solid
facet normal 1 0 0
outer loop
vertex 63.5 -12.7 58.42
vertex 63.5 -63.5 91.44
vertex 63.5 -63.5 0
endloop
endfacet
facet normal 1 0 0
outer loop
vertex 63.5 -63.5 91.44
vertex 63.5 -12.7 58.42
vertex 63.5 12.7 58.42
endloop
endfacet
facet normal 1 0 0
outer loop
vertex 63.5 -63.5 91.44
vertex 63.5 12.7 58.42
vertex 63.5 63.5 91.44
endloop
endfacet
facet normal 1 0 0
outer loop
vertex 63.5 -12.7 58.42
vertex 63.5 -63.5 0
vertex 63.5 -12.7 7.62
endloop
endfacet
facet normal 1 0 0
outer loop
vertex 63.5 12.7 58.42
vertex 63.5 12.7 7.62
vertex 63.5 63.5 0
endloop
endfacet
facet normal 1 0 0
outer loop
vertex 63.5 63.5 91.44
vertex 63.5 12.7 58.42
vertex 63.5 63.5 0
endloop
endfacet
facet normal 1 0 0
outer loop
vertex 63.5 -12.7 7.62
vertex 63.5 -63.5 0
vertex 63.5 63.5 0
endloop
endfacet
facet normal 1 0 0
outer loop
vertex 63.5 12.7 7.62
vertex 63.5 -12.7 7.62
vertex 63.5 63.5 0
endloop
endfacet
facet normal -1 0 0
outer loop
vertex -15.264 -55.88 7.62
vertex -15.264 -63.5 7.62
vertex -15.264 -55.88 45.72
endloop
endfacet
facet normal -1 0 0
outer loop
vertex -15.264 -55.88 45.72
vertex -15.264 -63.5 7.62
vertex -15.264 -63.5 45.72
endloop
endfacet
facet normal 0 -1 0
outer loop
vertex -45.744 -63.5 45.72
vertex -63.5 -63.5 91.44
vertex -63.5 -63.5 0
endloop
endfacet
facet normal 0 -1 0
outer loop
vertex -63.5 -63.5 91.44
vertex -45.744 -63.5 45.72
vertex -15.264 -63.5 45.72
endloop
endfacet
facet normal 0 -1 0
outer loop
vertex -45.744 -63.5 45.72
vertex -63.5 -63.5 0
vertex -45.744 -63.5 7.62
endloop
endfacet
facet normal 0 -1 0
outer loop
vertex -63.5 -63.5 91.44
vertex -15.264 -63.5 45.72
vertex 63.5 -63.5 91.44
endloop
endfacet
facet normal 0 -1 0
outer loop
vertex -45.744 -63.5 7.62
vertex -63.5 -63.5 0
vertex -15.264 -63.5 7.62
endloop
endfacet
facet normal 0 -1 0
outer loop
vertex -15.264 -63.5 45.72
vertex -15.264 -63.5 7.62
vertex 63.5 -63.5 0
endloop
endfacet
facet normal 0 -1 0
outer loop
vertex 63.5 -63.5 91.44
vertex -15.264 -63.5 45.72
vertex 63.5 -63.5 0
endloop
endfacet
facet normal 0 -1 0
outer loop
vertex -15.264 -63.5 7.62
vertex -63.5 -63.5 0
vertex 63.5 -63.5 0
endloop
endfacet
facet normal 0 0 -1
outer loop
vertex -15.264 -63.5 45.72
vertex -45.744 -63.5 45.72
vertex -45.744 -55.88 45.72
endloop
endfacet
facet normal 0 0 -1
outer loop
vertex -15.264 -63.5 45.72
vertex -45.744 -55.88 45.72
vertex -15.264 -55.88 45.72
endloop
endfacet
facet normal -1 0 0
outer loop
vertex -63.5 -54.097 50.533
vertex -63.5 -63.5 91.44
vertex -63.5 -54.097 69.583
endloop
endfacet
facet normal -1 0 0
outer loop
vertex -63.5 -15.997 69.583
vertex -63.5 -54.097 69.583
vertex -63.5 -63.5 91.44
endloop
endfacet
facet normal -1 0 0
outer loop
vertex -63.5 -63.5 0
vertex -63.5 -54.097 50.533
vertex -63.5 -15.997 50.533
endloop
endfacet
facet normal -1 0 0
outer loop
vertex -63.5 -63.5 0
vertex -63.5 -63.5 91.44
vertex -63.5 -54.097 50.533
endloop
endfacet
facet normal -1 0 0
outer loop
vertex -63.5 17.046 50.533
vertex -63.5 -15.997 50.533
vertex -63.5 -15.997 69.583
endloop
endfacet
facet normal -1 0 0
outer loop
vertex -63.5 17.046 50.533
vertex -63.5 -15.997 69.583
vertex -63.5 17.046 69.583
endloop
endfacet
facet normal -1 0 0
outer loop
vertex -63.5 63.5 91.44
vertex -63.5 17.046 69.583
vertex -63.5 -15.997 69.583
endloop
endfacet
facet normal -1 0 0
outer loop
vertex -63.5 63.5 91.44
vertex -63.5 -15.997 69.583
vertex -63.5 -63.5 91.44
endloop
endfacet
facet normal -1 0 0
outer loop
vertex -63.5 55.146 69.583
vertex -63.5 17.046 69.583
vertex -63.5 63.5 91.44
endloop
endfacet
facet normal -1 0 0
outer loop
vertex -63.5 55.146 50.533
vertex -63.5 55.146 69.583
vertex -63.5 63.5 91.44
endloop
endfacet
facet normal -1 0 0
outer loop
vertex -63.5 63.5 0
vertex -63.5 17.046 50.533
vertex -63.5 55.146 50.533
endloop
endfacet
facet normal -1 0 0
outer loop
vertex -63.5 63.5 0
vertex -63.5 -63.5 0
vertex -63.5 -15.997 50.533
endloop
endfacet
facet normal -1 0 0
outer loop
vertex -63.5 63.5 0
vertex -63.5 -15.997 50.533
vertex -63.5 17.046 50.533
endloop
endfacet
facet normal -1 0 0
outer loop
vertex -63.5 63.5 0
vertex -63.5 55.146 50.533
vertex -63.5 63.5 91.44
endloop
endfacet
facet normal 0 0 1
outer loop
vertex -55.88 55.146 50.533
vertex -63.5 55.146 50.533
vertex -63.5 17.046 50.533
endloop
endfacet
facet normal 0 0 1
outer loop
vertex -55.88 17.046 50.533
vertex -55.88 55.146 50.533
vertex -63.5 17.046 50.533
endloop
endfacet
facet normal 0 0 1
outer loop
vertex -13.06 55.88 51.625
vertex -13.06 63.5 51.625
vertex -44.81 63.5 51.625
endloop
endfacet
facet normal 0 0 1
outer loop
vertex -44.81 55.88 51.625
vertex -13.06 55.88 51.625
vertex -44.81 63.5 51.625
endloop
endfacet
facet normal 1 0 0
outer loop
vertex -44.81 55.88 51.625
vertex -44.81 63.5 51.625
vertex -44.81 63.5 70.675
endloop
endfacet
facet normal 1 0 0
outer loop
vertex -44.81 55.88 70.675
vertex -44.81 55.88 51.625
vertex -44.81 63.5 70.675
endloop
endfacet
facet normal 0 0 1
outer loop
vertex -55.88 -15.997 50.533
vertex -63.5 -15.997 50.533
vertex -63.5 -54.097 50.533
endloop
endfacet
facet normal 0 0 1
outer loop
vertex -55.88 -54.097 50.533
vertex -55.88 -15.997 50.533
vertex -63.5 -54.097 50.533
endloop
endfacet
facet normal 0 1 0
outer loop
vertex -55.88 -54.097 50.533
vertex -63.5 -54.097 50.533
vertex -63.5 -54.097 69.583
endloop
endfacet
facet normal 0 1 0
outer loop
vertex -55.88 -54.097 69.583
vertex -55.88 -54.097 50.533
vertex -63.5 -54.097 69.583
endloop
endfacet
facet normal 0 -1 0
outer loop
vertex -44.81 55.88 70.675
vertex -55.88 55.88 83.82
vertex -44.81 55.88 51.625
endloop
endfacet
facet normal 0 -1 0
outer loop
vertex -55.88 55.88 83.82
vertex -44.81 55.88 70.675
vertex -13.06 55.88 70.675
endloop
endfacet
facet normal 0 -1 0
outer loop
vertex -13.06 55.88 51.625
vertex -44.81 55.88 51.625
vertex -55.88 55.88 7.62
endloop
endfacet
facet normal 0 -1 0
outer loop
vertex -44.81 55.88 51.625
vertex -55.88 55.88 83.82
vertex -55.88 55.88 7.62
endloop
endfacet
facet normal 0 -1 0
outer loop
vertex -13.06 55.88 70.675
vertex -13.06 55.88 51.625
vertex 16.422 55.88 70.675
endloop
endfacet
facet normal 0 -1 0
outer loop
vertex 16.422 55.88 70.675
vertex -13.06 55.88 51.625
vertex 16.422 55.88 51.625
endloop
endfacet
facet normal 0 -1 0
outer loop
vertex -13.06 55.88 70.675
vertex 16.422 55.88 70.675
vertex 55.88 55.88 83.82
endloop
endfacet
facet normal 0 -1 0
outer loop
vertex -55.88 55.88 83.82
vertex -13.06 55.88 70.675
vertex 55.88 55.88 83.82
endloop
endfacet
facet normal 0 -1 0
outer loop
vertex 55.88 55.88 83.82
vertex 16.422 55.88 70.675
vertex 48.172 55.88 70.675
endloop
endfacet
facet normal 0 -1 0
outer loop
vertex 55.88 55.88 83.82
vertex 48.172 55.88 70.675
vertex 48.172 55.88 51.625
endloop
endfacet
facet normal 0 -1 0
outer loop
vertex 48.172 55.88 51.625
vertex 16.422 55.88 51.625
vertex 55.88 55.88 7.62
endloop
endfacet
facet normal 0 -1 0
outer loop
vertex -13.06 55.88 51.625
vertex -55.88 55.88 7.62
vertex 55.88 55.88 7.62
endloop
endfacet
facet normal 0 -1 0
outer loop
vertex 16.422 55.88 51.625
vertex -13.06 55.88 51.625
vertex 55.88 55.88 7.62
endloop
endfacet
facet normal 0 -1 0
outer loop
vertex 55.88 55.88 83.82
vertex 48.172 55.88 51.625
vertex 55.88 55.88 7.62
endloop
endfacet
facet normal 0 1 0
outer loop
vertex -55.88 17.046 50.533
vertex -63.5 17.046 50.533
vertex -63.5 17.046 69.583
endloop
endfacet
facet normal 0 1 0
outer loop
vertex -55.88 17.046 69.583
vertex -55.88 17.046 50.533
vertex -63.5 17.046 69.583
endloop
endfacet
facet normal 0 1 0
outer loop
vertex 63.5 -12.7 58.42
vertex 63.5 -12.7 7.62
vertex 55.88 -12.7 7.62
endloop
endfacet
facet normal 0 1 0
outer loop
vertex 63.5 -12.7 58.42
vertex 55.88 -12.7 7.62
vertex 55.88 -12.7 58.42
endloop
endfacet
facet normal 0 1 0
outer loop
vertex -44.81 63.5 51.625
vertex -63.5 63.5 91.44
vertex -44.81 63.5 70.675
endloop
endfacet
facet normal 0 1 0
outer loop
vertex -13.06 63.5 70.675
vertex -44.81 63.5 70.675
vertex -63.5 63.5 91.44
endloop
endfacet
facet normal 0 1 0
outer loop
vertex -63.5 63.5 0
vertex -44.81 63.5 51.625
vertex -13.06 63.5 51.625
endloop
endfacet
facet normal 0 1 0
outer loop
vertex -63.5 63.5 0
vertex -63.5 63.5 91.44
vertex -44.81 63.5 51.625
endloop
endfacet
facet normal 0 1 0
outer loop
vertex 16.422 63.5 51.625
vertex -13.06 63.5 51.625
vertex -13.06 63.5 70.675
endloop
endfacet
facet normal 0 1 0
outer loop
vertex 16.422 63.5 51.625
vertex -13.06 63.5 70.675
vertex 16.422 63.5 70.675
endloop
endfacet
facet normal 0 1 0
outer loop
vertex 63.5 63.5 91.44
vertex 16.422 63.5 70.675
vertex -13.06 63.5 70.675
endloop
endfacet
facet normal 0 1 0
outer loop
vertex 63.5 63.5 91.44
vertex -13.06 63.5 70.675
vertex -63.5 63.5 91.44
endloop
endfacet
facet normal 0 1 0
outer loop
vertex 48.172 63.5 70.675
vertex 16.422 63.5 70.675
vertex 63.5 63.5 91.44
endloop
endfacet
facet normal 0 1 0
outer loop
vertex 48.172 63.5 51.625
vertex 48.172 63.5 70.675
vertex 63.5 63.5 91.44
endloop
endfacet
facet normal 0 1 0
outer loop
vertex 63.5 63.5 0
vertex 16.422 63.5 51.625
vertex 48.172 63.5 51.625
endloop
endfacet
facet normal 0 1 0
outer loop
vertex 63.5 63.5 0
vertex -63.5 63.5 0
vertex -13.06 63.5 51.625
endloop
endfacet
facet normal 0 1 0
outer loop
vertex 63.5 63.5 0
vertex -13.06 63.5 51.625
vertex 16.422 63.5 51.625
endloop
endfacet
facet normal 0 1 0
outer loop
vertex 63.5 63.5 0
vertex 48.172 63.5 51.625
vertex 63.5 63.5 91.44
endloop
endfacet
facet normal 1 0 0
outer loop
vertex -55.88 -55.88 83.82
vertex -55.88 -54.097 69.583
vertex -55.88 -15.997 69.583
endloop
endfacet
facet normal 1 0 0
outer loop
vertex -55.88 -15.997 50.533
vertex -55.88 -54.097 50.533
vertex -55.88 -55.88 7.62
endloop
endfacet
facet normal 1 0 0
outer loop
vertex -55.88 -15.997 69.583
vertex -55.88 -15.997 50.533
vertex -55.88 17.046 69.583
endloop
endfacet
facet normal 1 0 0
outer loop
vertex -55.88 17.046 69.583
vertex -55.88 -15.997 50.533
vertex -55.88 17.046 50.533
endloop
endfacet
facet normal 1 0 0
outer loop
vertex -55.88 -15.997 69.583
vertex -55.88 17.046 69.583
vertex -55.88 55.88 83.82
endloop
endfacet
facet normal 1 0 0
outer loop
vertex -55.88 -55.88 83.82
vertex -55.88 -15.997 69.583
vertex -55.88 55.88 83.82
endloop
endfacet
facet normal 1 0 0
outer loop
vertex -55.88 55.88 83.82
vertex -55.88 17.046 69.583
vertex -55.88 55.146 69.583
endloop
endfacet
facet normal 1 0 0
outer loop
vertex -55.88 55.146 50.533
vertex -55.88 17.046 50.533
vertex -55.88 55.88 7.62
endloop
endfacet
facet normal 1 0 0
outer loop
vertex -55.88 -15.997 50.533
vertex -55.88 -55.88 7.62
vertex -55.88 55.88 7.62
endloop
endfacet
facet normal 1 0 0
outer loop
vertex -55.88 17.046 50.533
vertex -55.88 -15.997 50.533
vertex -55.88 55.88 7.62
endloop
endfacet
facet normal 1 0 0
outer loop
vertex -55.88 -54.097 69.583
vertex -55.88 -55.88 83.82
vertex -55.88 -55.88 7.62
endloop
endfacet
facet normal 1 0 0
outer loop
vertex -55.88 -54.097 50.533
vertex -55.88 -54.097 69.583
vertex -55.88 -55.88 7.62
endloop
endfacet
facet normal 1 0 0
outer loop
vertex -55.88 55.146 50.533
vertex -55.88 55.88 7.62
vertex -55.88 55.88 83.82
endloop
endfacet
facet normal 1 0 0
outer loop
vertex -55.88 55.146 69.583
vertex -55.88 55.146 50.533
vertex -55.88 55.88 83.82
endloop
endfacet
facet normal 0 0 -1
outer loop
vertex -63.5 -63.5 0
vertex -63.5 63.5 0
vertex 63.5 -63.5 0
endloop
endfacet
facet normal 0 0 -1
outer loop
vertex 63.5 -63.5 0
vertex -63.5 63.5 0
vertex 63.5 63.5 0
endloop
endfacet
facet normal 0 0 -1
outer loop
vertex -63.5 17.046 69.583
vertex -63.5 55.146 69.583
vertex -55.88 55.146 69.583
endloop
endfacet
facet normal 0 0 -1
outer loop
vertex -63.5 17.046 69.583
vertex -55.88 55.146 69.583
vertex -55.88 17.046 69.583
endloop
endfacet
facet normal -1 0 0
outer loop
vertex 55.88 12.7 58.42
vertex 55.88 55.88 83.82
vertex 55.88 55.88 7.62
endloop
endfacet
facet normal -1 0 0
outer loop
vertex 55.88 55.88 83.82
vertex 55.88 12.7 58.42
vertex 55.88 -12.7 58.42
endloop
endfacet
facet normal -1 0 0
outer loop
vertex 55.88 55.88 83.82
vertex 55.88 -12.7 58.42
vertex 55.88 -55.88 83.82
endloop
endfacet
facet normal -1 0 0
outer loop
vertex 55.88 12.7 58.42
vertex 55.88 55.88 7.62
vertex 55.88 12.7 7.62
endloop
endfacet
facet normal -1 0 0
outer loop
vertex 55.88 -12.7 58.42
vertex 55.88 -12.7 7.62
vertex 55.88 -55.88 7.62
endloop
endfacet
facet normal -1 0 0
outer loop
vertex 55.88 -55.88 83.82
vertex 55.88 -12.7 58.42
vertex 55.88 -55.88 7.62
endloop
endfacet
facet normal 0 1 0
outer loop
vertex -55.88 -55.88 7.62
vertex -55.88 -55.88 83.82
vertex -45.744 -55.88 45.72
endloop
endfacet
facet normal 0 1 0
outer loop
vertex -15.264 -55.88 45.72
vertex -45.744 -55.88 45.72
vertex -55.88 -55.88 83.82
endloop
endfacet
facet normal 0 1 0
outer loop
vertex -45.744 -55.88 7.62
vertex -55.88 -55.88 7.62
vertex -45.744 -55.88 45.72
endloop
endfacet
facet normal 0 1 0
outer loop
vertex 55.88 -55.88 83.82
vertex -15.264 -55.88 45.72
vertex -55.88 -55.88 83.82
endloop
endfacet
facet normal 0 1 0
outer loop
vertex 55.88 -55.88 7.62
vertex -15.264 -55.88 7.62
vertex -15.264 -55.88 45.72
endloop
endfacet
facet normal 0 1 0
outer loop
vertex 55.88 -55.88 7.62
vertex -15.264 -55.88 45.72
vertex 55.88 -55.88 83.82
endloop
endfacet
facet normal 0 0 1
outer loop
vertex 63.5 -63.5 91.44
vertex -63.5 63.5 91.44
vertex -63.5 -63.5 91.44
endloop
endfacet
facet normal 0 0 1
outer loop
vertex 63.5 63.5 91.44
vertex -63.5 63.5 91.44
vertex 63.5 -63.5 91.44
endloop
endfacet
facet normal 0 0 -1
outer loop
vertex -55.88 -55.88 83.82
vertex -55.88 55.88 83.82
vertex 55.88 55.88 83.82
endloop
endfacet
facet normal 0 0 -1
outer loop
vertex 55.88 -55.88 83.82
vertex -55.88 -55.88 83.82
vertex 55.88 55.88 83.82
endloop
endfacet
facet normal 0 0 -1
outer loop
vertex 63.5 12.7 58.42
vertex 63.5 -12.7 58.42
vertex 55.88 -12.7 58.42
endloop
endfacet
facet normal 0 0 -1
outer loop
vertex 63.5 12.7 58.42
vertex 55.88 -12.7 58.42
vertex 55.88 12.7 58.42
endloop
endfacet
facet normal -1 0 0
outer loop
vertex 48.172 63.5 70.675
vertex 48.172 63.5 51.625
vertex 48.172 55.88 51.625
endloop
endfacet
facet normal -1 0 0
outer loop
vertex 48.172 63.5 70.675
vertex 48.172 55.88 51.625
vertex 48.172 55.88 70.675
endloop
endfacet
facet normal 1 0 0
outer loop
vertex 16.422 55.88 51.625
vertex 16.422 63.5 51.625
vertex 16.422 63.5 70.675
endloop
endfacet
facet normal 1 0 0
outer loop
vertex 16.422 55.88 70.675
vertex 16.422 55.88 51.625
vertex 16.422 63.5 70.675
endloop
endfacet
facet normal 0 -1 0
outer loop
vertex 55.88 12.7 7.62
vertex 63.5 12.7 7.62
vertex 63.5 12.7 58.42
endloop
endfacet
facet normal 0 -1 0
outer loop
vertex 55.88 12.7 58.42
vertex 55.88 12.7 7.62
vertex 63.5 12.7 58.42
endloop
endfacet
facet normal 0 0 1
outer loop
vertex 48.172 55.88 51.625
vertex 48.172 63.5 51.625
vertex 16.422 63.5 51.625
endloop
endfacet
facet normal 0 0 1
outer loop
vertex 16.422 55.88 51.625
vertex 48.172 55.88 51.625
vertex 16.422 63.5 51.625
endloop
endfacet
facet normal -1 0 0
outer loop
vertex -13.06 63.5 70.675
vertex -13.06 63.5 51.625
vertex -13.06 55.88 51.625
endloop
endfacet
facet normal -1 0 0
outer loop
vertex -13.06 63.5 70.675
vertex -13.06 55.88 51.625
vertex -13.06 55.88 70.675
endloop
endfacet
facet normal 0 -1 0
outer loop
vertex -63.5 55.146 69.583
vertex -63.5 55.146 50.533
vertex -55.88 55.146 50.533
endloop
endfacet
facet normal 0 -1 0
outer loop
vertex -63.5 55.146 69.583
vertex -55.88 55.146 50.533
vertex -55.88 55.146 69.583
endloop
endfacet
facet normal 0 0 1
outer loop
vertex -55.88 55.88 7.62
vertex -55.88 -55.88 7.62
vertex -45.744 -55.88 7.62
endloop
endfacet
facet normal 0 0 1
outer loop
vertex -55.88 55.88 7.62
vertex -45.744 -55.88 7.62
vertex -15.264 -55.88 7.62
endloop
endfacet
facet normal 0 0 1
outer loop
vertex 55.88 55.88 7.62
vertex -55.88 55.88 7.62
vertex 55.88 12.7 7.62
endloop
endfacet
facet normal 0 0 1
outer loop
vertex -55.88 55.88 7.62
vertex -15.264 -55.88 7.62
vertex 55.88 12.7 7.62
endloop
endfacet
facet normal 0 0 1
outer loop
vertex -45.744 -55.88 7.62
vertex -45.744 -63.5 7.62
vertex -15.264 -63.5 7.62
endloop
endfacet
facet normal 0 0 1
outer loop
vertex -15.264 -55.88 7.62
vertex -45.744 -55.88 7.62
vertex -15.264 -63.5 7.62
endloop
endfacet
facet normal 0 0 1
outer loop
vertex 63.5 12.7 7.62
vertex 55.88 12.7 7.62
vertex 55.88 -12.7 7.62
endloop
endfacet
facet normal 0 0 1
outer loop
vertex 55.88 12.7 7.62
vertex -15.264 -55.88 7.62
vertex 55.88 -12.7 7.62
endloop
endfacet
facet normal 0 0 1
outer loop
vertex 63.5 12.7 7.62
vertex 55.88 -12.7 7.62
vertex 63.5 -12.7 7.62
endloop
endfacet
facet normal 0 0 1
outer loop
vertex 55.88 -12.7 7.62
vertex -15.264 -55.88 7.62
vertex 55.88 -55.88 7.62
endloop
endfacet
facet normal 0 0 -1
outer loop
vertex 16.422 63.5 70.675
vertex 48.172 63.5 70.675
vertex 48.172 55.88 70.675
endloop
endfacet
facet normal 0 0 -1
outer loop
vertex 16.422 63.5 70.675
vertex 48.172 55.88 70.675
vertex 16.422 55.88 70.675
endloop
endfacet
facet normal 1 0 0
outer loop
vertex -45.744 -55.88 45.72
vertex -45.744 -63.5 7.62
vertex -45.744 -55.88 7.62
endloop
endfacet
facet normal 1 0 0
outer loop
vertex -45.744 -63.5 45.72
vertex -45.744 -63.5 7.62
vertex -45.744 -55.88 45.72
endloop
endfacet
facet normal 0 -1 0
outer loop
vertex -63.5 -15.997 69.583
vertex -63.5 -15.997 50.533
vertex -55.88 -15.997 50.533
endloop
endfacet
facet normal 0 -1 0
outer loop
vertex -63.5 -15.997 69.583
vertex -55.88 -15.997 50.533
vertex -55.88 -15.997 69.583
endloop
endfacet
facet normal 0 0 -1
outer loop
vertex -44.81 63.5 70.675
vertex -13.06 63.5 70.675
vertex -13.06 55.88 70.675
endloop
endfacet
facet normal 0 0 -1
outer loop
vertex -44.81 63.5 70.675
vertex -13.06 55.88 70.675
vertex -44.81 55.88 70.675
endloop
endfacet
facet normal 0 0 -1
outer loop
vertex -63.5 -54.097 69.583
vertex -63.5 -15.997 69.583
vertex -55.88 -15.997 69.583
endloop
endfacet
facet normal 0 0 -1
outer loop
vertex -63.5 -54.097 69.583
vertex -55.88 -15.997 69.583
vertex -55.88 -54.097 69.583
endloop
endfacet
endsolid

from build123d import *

# Parameters (mm, degrees)
F0_W      = 127
F0_H      = 127
F1_DEPTH  = 7.62
F2_W      = 111.76
F2_H      = 7.62
F3_DEPTH  = 76.2
F4_W      = 25.4
F4_H      = 50.8
F5_DEPTH  = 7.62
F6_W      = 31.75
F6_H      = 19.05
F7_DEPTH  = 7.62
F8_W      = 38.1
F8_H      = 19.05
F9_DEPTH  = 7.62
F10_W     = 127
F10_H     = 127
F11_DEPTH = 7.62
F12_W     = 30.48
F12_H     = 38.1
F13_DEPTH = 7.62


with BuildPart() as f1:
    # F0 (on Top) → F1 (new body)
    with BuildSketch(Plane.XY):
        Rectangle(F0_W, F0_H)
    extrude(amount=F1_DEPTH)

    # F2 (on face) → F3 (join)
    with BuildSketch(Plane.XY.offset(7.62)):
        Polygon((-55.88, 63.5), (-63.5, 63.5), (-63.5, -63.5), (-55.88, -63.5), (-55.88, -55.88), (-55.88, 55.88), align=None)
        with Locations((0, 59.69)):
            Rectangle(F2_W, F2_H)
        Polygon((63.5, 63.5), (55.88, 63.5), (55.88, 55.88), (55.88, -55.88), (55.88, -63.5), (63.5, -63.5), align=None)
        with Locations((0, -59.69)):
            Rectangle(F2_W, F2_H)
    extrude(amount=F3_DEPTH)

    # F4 (on face) → F5 (cut, through all)
    with BuildSketch(Plane.YZ.offset(63.5)):
        with Locations((0, 33.02)):
            Rectangle(F4_W, F4_H)
    extrude(amount=-F5_DEPTH, mode=Mode.SUBTRACT)

    # F6 (on face) → F7 (cut, through all)
    with BuildSketch(Plane(origin=(0, 63.5, 0), x_dir=(-1, 0, 0), z_dir=(0, 1, 0))):
        with Locations((-32.296811, 61.150191)):
            Rectangle(F6_W, F6_H)
        with Locations((28.935332, 61.150191)):
            Rectangle(F6_W, F6_H)
    extrude(amount=-F7_DEPTH, mode=Mode.SUBTRACT)

    # F8 (on face) → F9 (cut, through all)
    with BuildSketch(Plane(origin=(-63.5, 0, 0), x_dir=(0, -1, 0), z_dir=(-1, 0, 0))):
        with Locations((-36.095939, 60.058468)):
            Rectangle(F8_W, F8_H)
        with Locations((35.046541, 60.058468)):
            Rectangle(F8_W, F8_H)
    extrude(amount=-F9_DEPTH, mode=Mode.SUBTRACT)

    # F10 (on face) → F11 (join)
    with BuildSketch(Plane.XY.offset(83.82)):
        Rectangle(F10_W, F10_H)
    extrude(amount=F11_DEPTH)

    # F12 (on face) → F13 (cut, through all)
    with BuildSketch(Plane.XZ.offset(63.5)):
        with Locations((-30.503813, 26.67)):
            Rectangle(F12_W, F12_H)
    extrude(amount=-F13_DEPTH, mode=Mode.SUBTRACT)


solid = f1.part
